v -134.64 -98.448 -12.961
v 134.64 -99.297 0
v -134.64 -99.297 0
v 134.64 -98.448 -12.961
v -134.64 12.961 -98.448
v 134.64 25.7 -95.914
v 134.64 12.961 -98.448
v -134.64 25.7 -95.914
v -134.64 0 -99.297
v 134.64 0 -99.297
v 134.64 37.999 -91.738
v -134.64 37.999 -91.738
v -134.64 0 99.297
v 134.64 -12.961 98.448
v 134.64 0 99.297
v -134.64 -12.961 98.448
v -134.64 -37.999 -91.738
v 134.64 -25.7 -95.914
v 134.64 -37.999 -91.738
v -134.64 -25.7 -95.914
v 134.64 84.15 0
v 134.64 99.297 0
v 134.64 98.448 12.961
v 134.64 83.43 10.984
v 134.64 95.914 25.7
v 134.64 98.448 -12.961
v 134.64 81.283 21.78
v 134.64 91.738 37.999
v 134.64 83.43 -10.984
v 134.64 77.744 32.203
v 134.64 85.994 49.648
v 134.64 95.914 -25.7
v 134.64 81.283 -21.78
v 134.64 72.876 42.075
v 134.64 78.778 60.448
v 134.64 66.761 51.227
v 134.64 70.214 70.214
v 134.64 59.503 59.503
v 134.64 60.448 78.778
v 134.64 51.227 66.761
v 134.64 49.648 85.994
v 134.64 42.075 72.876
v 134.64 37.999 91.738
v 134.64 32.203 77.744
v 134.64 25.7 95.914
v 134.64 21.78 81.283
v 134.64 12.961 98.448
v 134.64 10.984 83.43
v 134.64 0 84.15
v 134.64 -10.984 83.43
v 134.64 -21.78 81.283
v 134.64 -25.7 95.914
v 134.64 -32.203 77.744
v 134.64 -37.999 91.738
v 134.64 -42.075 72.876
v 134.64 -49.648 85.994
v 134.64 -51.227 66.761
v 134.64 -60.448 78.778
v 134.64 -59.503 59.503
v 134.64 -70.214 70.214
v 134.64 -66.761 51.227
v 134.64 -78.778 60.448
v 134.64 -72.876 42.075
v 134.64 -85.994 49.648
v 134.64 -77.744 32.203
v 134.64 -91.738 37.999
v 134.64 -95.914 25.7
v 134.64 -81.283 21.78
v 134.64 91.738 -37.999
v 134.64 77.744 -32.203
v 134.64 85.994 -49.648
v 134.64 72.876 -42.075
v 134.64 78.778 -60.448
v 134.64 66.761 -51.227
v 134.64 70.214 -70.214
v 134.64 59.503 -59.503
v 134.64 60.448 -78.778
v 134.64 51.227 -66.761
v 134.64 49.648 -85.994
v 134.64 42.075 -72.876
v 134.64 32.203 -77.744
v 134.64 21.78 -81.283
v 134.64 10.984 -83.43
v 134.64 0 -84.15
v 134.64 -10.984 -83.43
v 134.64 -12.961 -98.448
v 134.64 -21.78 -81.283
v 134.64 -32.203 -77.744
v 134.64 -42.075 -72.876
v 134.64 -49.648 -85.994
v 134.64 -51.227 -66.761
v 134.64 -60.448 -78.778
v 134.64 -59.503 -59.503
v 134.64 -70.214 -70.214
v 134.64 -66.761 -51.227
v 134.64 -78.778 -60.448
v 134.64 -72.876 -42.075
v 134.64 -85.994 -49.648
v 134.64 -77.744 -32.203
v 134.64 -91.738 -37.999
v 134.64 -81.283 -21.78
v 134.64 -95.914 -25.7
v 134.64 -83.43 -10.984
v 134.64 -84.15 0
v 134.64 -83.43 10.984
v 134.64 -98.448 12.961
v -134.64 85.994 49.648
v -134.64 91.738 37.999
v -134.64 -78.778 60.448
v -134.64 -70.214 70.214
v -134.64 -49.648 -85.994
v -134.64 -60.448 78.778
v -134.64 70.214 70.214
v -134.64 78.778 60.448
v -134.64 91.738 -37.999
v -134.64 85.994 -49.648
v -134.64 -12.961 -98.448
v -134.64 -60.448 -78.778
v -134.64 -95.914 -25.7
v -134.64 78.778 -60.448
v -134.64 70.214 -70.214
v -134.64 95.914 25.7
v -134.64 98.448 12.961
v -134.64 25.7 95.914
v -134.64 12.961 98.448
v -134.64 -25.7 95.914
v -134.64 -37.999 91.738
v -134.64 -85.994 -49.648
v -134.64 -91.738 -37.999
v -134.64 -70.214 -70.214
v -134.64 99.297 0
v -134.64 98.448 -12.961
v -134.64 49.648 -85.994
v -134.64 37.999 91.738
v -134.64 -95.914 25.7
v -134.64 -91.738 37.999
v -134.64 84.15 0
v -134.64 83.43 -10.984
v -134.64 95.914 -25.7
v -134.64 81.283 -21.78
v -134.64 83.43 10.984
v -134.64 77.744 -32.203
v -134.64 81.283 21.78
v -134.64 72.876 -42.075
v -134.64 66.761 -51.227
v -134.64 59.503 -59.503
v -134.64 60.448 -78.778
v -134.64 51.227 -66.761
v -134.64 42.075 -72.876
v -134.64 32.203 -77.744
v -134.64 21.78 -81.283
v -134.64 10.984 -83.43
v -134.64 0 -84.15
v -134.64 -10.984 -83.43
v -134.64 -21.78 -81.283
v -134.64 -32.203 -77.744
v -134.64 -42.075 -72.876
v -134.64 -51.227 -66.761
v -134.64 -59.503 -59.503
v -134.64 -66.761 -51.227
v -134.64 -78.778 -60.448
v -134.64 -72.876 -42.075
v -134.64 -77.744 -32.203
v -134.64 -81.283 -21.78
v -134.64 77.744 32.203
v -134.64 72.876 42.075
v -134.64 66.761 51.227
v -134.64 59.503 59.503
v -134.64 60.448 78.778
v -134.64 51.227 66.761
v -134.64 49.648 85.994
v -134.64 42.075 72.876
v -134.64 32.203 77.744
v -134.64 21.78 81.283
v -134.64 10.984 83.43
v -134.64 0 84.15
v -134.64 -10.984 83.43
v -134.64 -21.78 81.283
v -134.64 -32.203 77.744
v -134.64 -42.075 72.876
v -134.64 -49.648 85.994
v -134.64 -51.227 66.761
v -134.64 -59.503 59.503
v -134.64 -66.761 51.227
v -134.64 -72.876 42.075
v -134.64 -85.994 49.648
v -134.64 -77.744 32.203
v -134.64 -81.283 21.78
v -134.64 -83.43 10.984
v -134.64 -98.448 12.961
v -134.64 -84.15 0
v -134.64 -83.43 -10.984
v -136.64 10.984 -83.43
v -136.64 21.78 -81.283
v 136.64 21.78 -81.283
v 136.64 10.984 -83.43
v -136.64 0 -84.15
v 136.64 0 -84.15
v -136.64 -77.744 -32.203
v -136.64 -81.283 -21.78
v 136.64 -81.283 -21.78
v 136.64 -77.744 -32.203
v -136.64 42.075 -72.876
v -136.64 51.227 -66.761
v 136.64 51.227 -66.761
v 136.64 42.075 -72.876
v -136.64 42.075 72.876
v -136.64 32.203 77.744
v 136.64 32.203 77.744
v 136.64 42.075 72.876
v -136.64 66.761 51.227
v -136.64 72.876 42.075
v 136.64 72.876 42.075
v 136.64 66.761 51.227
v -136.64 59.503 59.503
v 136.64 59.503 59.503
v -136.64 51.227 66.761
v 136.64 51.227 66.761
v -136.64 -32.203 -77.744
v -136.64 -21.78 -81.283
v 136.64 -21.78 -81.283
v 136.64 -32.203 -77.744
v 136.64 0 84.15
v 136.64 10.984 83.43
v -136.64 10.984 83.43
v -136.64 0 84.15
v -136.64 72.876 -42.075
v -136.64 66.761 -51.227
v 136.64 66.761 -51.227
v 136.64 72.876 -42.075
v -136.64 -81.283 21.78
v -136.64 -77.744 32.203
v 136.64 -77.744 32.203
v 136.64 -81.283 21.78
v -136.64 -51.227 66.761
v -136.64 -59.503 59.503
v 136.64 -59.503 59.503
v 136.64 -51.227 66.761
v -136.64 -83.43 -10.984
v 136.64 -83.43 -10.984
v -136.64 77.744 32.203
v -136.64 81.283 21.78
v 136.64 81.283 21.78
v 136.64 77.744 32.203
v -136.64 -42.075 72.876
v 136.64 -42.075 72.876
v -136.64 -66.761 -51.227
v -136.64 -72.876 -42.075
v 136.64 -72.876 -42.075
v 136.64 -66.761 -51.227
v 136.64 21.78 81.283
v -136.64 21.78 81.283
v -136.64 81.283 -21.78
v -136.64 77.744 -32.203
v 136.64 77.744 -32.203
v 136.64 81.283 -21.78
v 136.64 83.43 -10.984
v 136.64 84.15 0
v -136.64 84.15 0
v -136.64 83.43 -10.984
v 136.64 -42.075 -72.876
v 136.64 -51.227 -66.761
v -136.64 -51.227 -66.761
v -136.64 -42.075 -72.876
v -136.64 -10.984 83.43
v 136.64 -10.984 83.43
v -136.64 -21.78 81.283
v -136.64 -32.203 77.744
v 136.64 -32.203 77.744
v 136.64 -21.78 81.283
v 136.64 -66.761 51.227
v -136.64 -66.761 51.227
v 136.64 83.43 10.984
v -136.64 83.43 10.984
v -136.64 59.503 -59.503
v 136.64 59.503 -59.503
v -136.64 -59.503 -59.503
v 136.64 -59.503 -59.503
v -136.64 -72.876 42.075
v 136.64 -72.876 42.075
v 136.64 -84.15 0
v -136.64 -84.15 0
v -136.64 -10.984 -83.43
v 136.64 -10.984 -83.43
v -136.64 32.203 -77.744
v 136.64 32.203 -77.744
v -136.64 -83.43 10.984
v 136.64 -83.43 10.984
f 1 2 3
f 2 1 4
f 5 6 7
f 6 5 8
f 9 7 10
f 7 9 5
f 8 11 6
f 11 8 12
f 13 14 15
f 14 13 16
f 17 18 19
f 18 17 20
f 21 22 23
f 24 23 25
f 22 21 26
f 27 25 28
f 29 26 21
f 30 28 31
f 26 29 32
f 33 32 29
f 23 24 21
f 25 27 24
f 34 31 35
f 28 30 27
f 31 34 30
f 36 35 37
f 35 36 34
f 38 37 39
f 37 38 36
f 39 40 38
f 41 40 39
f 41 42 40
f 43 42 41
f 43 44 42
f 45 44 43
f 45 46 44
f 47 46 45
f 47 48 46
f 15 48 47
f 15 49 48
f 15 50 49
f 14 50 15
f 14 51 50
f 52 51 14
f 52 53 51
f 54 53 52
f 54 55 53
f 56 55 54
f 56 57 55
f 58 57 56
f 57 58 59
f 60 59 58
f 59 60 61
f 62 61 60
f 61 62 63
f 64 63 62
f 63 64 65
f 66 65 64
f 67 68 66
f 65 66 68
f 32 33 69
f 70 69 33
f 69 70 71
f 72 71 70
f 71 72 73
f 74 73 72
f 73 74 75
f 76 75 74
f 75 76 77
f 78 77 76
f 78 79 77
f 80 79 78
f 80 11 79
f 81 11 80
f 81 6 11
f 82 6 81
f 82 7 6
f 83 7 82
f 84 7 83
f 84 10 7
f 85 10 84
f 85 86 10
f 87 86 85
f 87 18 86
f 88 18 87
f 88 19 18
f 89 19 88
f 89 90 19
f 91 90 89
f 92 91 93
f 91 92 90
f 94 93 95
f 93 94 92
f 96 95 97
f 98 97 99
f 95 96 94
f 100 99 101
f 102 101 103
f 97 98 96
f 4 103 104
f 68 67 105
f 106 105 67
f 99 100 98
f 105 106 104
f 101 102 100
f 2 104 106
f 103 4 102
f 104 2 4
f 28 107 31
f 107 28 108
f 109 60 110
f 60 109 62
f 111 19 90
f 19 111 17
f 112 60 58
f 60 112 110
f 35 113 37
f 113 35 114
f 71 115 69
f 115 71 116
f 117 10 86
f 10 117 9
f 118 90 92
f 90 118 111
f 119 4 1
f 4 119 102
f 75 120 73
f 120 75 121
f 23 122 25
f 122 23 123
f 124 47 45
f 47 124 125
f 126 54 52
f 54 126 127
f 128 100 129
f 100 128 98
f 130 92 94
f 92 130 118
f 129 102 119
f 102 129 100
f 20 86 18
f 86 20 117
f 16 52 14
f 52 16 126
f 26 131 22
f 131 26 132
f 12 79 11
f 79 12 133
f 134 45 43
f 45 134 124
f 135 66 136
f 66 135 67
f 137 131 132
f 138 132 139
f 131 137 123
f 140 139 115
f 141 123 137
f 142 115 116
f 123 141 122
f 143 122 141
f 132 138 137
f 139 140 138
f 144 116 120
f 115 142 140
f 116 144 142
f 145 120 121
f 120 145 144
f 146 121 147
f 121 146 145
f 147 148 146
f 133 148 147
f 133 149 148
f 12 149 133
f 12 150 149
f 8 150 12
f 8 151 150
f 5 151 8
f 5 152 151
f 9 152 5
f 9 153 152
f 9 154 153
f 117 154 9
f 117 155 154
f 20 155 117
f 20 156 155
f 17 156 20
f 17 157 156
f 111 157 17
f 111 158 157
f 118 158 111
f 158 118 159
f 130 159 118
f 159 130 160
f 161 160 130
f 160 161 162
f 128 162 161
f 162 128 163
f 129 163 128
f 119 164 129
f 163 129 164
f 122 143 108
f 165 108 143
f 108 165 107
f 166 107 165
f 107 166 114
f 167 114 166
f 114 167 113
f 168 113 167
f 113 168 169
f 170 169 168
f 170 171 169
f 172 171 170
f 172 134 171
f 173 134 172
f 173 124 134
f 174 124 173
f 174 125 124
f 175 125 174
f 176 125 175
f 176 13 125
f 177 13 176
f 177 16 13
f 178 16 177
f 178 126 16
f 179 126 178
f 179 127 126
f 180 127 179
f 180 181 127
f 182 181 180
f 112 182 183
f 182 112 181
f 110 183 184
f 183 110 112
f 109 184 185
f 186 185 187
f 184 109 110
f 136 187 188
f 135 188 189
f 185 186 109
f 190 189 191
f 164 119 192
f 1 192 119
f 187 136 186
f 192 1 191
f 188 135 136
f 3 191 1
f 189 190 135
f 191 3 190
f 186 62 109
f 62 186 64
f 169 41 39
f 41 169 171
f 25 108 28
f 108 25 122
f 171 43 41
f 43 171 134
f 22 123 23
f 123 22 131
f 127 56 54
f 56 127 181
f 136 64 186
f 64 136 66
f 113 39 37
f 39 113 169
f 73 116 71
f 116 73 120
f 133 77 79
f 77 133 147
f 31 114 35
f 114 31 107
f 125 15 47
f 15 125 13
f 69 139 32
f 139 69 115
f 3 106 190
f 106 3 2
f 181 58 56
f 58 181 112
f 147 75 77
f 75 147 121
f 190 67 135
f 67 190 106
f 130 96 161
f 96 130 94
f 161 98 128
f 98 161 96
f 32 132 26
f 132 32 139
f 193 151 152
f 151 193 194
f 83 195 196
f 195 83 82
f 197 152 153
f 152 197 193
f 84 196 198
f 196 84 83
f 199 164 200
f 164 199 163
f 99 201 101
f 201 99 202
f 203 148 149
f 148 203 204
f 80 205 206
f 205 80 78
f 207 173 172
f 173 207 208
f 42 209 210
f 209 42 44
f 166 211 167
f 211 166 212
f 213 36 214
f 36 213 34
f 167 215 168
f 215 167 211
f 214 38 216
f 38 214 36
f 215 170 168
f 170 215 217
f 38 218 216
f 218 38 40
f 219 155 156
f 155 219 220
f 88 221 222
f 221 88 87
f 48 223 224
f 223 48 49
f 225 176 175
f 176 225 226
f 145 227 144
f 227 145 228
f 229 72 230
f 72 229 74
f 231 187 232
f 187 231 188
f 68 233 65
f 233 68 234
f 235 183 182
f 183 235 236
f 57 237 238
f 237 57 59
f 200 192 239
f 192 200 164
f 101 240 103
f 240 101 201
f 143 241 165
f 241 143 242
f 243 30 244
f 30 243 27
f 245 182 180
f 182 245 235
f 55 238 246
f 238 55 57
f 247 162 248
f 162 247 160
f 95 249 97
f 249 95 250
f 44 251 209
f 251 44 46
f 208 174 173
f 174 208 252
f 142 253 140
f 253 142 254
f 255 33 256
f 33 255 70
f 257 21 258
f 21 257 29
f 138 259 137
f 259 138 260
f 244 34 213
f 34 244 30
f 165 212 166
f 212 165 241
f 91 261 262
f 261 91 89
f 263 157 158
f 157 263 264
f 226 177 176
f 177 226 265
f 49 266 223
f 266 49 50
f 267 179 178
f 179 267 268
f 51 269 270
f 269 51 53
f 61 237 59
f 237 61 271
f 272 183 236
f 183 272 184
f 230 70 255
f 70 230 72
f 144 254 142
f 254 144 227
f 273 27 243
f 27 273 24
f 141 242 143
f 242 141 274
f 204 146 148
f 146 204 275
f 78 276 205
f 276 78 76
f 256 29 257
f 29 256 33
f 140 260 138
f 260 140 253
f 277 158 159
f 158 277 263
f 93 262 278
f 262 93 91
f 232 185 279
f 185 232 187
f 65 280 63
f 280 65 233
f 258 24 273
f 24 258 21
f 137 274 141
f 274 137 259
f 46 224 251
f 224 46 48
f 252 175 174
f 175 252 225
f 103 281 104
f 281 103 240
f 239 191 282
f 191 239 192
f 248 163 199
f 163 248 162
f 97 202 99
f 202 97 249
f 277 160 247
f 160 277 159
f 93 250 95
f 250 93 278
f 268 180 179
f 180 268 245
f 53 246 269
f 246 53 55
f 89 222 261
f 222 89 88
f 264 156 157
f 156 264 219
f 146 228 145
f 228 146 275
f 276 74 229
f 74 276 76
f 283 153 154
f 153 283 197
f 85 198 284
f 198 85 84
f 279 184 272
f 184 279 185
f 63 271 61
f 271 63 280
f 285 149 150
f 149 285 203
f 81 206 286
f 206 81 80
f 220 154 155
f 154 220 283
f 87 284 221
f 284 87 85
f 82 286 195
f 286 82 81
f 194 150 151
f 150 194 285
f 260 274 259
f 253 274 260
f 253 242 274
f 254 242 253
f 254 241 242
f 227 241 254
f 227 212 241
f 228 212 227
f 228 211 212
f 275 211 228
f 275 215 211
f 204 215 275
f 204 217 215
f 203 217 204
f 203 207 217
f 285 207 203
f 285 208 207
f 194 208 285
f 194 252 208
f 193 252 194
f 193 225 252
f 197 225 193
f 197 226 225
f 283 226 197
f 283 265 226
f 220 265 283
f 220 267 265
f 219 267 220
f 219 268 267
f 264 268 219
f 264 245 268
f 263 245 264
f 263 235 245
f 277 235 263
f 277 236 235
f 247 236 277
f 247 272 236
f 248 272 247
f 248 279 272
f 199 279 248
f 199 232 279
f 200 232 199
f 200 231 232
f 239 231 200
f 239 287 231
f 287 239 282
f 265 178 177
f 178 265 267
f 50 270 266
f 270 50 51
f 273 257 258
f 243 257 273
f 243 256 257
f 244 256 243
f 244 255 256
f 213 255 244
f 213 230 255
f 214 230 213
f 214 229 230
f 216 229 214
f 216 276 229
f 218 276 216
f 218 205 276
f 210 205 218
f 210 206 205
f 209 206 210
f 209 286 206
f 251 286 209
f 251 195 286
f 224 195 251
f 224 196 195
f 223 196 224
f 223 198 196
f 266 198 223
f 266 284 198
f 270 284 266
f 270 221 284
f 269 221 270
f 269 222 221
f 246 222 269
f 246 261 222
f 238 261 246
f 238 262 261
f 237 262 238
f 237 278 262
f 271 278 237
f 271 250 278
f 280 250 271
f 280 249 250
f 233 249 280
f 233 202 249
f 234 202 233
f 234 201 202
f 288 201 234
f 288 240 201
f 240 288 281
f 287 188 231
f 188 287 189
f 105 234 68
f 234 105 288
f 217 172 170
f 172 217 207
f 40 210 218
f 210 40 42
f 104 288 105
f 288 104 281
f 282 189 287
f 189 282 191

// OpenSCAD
// Auto-generated by scripts/author_from_manifest.py (Phase D.3).
// Source: data/phase_d_manifest.json (sku_intent='victaulic-107v-quickvic-coupling-6in').
// Do not hand-edit — regenerate from the manifest.
//
// @part victaulic_107v_quickvic_coupling_6in
// @kind fitting
// @category fitting.coupling
// @display-name "Victaulic QuickVic Style 107V Installation-Ready Coupling 6\""
// @mfg victaulic
// @mfg-pn Style_107V_6in
// @listing UL FM
// @price-usd 72.00
// @install-minutes 6
// @crew journeyman
// @param size_in number default=6 label="Size" unit="in"
// @port inlet position=[-0.05,0,0] direction=[-1,0,0] style=grooved size_in=6 role=run_a
// @port outlet position=[0.05,0,0] direction=[1,0,0] style=grooved size_in=6 role=run_b

size_in = 6.0;

function od_mm(nps) =
    nps ==   1  ? 33.4 :
    nps == 1.25 ? 42.2 :
    nps == 1.5  ? 48.3 :
    nps ==   2  ? 60.3 :
    nps == 2.5  ? 73.0 :
    nps ==   3  ? 88.9 :
    nps ==   4  ? 114.3 :
    nps ==   5  ? 141.3 :
    nps ==   6  ? 168.3 :
    nps ==   8  ? 219.1 :
    nps ==  10  ? 273.0 : 60.3;

od = od_mm(size_in);
len_mm = od * 1.6;

rotate([0, 90, 0])
    union() {
        cylinder(h = len_mm, d = od * 1.18, center = true, $fn = 48);
        cylinder(h = len_mm + 4, d = od, center = true, $fn = 48);
    }
